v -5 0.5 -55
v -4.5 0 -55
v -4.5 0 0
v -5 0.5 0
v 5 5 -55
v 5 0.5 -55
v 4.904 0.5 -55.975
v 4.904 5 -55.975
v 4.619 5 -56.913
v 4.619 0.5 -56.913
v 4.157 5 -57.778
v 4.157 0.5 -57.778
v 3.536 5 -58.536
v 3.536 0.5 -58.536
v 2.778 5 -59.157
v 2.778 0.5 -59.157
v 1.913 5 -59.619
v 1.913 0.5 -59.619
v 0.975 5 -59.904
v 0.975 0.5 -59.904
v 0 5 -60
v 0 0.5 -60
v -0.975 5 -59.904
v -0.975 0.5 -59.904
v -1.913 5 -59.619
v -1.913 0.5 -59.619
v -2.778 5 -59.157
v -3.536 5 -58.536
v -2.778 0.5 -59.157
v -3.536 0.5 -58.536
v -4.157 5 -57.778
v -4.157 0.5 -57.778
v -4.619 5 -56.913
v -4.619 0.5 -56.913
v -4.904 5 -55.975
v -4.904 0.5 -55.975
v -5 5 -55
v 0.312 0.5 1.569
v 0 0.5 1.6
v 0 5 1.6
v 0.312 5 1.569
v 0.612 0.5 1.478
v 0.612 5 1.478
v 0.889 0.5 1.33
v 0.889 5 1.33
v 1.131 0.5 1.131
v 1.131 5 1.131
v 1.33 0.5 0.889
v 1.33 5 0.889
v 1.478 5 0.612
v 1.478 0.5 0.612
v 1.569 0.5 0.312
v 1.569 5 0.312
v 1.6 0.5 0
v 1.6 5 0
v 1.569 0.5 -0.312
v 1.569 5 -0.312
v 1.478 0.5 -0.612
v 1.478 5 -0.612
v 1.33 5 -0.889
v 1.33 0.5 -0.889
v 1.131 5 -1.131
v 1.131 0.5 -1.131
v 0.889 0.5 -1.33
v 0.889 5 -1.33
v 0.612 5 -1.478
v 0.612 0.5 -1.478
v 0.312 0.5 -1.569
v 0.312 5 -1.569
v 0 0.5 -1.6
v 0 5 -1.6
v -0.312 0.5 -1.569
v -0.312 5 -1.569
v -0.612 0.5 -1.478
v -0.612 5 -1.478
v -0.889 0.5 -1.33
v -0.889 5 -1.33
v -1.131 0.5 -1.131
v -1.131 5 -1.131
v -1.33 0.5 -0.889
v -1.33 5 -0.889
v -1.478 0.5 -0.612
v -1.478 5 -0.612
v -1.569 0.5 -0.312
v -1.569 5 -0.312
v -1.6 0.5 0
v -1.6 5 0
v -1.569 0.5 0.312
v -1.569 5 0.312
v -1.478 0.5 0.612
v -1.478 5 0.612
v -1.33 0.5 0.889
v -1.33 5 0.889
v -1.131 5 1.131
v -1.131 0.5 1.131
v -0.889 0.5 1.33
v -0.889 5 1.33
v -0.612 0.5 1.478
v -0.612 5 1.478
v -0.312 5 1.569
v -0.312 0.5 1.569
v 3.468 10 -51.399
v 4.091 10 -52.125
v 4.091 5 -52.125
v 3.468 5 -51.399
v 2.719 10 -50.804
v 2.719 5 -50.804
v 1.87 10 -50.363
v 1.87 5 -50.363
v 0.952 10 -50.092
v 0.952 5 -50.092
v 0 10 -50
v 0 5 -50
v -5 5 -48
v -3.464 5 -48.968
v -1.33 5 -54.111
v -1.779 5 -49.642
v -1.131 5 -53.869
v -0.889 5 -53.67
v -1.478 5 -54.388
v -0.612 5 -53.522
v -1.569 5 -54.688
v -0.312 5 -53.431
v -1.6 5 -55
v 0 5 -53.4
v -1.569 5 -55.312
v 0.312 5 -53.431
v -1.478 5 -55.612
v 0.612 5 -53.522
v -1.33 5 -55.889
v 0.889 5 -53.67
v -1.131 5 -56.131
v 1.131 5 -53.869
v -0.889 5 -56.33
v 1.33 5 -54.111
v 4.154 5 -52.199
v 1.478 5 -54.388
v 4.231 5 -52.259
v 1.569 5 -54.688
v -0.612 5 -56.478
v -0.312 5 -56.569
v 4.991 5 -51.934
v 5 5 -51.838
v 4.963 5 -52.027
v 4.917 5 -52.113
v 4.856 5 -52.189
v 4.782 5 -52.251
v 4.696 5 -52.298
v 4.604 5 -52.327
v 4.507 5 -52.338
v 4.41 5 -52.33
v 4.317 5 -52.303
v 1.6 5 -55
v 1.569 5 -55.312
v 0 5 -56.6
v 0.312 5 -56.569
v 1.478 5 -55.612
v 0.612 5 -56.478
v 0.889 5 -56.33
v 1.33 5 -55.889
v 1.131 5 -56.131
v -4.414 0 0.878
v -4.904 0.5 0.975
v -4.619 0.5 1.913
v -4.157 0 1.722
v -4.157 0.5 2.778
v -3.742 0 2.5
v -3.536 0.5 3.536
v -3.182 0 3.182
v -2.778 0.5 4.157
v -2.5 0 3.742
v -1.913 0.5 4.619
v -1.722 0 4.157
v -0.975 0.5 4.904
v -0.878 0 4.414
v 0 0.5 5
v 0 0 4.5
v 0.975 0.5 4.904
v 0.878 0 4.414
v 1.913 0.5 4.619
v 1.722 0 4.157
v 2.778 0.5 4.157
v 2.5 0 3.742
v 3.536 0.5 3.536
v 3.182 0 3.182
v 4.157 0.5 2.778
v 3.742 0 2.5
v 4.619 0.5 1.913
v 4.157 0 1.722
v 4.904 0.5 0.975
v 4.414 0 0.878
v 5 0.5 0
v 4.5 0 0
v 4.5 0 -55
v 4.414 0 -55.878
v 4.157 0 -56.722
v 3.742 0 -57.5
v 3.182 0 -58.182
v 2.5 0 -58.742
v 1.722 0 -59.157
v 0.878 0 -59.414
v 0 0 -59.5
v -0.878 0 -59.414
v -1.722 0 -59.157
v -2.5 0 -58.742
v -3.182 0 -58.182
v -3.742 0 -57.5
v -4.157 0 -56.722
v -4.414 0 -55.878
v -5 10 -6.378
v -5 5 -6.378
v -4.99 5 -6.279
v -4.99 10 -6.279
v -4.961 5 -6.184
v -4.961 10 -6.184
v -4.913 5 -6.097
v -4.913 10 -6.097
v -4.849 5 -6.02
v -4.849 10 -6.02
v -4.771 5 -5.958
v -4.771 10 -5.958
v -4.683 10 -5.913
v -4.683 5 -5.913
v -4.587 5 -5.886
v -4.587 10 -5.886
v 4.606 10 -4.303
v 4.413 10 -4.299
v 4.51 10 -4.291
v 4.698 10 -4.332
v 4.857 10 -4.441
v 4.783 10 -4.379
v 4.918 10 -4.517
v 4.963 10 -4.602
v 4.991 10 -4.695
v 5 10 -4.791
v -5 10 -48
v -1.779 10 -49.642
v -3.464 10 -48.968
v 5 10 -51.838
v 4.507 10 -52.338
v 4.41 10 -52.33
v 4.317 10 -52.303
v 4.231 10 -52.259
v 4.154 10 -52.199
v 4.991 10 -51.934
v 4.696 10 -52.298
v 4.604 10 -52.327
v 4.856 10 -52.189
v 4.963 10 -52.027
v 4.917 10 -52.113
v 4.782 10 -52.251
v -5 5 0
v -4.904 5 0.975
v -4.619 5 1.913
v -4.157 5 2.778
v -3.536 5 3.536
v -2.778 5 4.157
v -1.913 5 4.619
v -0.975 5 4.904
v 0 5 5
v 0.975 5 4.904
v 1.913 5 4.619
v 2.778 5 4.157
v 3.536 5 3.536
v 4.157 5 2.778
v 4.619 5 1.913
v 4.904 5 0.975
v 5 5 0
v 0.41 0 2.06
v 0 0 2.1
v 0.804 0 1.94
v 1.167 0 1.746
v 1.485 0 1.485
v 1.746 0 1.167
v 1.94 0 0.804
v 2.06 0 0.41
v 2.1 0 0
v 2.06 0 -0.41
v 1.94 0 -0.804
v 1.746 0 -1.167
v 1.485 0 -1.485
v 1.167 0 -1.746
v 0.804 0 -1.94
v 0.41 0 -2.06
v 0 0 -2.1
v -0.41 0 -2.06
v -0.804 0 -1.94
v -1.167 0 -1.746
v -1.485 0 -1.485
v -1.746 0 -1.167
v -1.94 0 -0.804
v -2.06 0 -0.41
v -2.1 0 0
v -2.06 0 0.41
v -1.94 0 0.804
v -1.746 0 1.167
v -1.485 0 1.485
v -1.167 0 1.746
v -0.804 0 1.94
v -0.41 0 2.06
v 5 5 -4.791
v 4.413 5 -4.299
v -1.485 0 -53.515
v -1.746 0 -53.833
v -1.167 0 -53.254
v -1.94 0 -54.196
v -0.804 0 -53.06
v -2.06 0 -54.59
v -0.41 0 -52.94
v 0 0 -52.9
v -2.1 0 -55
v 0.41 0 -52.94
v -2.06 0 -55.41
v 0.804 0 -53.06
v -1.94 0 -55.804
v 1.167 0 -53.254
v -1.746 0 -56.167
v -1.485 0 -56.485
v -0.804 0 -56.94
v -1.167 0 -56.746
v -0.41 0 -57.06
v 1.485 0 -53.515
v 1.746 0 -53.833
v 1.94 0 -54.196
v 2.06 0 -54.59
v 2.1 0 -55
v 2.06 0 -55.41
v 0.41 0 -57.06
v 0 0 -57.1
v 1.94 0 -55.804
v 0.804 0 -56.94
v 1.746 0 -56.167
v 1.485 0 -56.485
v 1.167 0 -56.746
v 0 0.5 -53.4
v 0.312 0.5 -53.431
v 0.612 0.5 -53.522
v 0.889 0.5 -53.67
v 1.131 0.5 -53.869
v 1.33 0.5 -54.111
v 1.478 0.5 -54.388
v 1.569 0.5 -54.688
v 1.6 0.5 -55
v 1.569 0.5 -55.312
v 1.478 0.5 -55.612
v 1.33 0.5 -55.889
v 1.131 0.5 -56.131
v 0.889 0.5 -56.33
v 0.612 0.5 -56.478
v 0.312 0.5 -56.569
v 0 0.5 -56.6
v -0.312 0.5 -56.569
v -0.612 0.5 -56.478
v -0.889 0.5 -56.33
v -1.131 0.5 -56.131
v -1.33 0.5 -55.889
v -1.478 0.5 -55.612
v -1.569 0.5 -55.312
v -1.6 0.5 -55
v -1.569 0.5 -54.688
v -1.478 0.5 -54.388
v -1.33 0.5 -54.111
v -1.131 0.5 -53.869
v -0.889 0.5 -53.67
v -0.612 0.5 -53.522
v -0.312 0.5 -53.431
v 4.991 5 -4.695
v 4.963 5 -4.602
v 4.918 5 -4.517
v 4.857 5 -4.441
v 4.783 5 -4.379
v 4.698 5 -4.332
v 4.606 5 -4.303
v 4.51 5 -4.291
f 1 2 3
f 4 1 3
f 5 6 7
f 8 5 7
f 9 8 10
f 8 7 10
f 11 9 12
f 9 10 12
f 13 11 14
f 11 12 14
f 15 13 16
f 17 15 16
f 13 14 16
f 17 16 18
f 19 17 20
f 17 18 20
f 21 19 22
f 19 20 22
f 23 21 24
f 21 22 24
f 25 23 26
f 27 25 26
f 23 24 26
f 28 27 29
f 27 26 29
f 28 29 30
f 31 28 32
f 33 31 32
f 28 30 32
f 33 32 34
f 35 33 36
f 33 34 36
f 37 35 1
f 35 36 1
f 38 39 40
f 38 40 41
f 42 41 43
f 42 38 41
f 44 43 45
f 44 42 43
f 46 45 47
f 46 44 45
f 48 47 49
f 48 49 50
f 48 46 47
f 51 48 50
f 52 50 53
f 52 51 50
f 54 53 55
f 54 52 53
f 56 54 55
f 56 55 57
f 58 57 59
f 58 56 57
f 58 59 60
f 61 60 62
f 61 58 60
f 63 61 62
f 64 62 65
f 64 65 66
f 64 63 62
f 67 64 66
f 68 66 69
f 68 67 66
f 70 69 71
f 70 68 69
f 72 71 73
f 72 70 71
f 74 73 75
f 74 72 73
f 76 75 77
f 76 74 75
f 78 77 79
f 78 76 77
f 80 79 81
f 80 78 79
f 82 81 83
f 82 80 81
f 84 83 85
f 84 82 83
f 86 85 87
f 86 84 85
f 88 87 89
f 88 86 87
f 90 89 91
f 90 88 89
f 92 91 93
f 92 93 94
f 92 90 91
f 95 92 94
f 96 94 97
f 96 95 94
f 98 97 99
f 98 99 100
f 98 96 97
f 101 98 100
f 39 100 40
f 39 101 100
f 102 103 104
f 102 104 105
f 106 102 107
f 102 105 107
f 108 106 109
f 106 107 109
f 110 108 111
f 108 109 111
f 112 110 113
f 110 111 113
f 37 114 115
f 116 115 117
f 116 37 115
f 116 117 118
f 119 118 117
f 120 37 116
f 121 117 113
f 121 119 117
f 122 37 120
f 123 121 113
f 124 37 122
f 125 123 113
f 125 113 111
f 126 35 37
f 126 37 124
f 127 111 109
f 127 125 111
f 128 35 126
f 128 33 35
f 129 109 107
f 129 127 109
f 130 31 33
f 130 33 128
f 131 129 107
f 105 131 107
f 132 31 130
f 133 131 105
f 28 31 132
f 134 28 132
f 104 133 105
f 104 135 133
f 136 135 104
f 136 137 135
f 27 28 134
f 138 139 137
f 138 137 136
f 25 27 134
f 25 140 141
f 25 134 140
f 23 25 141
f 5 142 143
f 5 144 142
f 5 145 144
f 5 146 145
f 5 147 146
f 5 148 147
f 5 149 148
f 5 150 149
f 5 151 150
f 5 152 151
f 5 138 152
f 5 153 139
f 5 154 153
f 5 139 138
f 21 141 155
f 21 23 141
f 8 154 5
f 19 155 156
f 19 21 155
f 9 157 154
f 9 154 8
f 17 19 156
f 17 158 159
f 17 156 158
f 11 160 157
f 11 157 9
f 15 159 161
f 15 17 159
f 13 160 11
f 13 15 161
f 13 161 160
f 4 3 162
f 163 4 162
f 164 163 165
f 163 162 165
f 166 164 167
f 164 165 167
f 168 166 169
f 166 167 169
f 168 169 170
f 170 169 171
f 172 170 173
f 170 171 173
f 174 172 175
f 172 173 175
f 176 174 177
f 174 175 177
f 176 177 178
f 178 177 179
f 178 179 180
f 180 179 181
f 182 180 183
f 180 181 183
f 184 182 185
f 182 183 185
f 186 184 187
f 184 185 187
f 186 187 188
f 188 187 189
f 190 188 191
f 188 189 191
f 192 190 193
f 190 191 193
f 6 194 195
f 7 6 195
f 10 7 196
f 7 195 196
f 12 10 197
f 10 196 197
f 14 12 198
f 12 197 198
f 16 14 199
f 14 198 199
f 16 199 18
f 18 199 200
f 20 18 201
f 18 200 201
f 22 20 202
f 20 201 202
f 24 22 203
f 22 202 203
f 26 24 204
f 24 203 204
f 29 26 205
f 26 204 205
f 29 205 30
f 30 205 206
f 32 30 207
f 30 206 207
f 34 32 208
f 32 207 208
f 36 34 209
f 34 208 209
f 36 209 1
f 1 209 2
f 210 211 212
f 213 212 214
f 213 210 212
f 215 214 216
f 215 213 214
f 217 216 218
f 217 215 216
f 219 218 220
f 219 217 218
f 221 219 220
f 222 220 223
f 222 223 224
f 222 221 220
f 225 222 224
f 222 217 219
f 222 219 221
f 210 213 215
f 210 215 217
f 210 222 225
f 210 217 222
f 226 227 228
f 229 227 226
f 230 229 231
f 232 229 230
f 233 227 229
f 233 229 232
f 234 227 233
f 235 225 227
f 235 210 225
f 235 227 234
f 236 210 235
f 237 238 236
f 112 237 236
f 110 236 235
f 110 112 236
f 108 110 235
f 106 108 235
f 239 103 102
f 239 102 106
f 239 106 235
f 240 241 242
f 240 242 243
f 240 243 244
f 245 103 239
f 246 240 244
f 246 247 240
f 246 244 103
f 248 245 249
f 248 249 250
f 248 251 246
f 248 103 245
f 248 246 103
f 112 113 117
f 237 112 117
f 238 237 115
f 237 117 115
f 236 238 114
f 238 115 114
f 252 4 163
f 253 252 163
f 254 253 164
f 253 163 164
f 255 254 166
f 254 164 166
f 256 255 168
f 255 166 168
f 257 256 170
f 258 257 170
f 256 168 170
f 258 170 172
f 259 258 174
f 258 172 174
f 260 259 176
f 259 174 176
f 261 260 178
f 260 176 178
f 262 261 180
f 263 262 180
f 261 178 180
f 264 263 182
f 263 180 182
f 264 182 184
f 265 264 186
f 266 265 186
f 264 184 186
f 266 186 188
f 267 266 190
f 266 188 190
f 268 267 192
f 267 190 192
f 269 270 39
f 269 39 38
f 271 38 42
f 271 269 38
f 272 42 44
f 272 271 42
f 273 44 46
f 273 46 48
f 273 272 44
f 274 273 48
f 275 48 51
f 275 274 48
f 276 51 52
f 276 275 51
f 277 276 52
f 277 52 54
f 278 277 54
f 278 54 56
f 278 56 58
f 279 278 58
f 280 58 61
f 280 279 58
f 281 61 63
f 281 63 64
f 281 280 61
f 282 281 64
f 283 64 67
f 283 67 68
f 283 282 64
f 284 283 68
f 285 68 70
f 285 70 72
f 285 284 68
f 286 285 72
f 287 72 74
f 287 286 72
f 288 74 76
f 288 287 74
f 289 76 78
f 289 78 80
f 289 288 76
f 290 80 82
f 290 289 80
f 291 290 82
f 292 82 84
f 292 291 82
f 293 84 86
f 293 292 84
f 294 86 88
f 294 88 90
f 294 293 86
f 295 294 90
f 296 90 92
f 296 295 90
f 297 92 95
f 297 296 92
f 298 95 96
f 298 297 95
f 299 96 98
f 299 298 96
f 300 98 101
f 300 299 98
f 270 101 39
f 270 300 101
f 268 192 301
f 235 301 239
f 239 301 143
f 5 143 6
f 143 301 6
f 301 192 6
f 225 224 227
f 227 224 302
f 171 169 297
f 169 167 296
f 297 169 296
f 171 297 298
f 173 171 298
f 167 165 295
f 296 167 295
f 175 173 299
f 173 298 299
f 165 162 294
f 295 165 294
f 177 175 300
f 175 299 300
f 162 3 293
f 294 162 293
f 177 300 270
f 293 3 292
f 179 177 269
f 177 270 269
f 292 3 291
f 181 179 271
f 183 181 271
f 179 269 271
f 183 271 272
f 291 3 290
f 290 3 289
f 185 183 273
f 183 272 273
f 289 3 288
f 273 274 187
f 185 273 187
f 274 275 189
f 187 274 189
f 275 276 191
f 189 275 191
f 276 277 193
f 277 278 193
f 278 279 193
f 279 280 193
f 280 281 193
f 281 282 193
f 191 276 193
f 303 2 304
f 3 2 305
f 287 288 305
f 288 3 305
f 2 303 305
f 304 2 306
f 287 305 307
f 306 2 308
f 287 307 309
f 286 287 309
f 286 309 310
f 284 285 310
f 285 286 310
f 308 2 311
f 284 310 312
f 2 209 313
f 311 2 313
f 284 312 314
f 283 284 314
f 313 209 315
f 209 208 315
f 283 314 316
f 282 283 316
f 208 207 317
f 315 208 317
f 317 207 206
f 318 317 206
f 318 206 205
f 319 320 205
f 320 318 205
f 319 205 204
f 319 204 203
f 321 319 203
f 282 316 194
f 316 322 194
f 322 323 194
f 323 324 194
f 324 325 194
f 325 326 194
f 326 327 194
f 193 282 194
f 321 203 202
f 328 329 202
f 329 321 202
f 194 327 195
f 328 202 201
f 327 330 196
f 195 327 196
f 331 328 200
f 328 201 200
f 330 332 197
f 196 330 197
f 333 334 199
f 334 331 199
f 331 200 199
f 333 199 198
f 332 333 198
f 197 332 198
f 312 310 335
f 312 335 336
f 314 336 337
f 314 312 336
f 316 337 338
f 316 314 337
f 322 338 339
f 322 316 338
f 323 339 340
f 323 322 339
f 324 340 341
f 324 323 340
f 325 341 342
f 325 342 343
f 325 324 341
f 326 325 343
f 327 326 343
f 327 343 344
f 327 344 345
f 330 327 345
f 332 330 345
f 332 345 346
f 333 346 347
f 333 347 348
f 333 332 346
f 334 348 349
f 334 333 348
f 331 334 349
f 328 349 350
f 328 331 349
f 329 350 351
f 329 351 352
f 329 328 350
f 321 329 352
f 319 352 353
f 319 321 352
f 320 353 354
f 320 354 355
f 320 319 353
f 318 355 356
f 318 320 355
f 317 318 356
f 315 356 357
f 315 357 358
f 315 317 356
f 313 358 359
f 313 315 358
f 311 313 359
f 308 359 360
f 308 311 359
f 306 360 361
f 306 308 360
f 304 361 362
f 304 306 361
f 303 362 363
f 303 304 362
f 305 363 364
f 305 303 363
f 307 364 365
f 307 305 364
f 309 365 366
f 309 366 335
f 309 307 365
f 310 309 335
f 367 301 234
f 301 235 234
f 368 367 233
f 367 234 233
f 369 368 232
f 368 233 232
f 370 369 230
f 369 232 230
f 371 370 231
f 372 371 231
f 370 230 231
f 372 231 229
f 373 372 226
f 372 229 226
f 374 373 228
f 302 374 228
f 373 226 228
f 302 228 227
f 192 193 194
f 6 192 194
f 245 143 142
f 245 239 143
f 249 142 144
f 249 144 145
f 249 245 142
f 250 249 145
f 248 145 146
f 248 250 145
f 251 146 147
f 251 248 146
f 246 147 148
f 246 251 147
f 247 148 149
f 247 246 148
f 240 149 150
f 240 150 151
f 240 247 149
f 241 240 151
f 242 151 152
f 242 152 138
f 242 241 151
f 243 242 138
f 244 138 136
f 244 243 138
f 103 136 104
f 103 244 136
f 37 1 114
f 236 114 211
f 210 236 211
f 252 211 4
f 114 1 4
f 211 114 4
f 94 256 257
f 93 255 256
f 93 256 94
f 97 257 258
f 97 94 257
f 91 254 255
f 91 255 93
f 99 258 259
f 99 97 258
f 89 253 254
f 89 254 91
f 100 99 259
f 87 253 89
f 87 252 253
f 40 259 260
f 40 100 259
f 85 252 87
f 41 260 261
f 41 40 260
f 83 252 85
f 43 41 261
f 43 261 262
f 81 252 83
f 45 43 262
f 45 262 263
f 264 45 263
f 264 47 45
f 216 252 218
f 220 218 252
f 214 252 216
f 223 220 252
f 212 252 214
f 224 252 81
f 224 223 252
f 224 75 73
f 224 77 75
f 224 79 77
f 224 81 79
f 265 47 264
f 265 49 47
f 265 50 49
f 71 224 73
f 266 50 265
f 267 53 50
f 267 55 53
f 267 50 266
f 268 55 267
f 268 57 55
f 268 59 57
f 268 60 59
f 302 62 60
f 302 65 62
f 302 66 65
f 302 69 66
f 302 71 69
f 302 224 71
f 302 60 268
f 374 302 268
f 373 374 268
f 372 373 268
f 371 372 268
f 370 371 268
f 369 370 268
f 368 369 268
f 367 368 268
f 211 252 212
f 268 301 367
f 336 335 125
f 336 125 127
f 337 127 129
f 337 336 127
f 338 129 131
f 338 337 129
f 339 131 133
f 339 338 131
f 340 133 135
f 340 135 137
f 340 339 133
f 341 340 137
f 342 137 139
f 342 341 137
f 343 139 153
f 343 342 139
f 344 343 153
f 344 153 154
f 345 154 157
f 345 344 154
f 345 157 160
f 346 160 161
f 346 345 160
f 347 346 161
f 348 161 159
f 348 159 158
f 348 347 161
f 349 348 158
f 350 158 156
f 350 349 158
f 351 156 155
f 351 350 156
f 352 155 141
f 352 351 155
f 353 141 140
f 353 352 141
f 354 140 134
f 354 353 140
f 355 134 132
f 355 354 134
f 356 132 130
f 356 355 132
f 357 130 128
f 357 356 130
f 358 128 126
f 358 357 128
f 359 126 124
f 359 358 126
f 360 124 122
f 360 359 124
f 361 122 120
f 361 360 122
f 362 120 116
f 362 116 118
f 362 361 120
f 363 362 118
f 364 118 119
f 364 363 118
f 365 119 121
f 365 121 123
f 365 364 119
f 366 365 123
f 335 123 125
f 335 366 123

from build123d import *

# Parameters (mm, degrees)
CENTER_BODY_DEPTH               = 10
SKETCH1_3_R                     = 1.6
SKETCH1_3_R_2                   = 1.6000000000000003
CONNECTOR_BODY_DEPTH            = 5
MECH_LOCK_LEFT_DEPTH            = 5
DULLING_FILLET_GENERAL_R        = 0.5
ELEPHANTSFOOT_COMPENSATION_SIZE = 0.5
DULLING_FILLET_LEFT_R           = 0.5


with BuildPart() as part:
    # complete_sketch → center_body (new body)
    with BuildSketch(Plane(origin=(0, 0, 0), x_dir=(1, 0, 0), z_dir=(0, 1, 0))):
        Polygon((-5, 47), (-5, 5.958767962971026), (5, 4.195498155886416), (5, 47), align=None)
    extrude(amount=CENTER_BODY_DEPTH)

    # Sketch1<3> → connector_body (add)
    # profile 1 of 2: a face of its own
    with BuildSketch(Plane(origin=(0, 0, 0), x_dir=(1, 0, 0), z_dir=(0, 1, 0))):
        with BuildLine():
            Line((-5, 5.958767962971026), (-5, 0))
            ThreePointArc((-5, 0), (-3.1e-16, -5), (5, -6.1e-16))
            Line((5, 0), (5, 4.195498155886416))
            Line((5, 4.195498155886416), (-5, 5.958767962971026))
        make_face()
        Circle(SKETCH1_3_R, mode=Mode.SUBTRACT)
    # profile 2 of 2: a face of its own
    with BuildSketch(Plane(origin=(0, 0, 0), x_dir=(1, 0, 0), z_dir=(0, 1, 0))):
        with BuildLine():
            Line((-5, 55), (-5, 47))
            Line((-5, 47), (5, 47))
            Line((5.000000000000001, 47), (5, 55))
            ThreePointArc((5, 55), (-1.4e-16, 60), (-5, 55))
        make_face()
        with Locations((0, 55)):
            Circle(SKETCH1_3_R_2, mode=Mode.SUBTRACT)
    extrude(amount=CONNECTOR_BODY_DEPTH)

    # Sketch1 → mech_lock_left (add)
    with BuildSketch(Plane(origin=(0, 5, 0), x_dir=(1, 0, 0), z_dir=(0, 1, 0))):
        with BuildLine():
            Line((-5, 47), (5, 47))
            Line((5, 47), (5, 55))
            ThreePointArc((5, 55), (3.535533905932735, 51.46446609406726), (0, 49.99999999999999))
            ThreePointArc((0, 49.99999999999999), (-2.637161951805669, 49.34290487951417), (-4.999999999999999, 48))
            Line((-4.999999999999999, 48), (-5, 47))
        make_face()
    extrude(amount=MECH_LOCK_LEFT_DEPTH)

    # dulling_fillet_general
    dulling_fillet_general_edges = [part.edges().sort_by_distance(p)[0] for p in [
        (5, 7.5, -4.195498155886416),
        (-5, 7.5, -5.958767962971026),
    ]]
    fillet(dulling_fillet_general_edges, radius=DULLING_FILLET_GENERAL_R)

    # elephantsfoot_compensation
    elephantsfoot_compensation_edges = [part.edges().sort_by_distance(p)[0] for p in [
        (-1.6000000000000003, 0, -55),
        (-1.6, 0, -2e-16),
        (1.4e-16, 0, 5),
        (-1.4e-16, 0, -60),
        (5, 0, -27.5),
        (-5, 0, -27.5),
    ]]
    chamfer(elephantsfoot_compensation_edges, length=ELEPHANTSFOOT_COMPENSATION_SIZE)

    # dulling_fillet_left
    dulling_fillet_left_edges = [part.edges().sort_by_distance(p)[0] for p in [
        (5, 7.5, -55),
    ]]
    fillet(dulling_fillet_left_edges, radius=DULLING_FILLET_LEFT_R)


solid = part.part
